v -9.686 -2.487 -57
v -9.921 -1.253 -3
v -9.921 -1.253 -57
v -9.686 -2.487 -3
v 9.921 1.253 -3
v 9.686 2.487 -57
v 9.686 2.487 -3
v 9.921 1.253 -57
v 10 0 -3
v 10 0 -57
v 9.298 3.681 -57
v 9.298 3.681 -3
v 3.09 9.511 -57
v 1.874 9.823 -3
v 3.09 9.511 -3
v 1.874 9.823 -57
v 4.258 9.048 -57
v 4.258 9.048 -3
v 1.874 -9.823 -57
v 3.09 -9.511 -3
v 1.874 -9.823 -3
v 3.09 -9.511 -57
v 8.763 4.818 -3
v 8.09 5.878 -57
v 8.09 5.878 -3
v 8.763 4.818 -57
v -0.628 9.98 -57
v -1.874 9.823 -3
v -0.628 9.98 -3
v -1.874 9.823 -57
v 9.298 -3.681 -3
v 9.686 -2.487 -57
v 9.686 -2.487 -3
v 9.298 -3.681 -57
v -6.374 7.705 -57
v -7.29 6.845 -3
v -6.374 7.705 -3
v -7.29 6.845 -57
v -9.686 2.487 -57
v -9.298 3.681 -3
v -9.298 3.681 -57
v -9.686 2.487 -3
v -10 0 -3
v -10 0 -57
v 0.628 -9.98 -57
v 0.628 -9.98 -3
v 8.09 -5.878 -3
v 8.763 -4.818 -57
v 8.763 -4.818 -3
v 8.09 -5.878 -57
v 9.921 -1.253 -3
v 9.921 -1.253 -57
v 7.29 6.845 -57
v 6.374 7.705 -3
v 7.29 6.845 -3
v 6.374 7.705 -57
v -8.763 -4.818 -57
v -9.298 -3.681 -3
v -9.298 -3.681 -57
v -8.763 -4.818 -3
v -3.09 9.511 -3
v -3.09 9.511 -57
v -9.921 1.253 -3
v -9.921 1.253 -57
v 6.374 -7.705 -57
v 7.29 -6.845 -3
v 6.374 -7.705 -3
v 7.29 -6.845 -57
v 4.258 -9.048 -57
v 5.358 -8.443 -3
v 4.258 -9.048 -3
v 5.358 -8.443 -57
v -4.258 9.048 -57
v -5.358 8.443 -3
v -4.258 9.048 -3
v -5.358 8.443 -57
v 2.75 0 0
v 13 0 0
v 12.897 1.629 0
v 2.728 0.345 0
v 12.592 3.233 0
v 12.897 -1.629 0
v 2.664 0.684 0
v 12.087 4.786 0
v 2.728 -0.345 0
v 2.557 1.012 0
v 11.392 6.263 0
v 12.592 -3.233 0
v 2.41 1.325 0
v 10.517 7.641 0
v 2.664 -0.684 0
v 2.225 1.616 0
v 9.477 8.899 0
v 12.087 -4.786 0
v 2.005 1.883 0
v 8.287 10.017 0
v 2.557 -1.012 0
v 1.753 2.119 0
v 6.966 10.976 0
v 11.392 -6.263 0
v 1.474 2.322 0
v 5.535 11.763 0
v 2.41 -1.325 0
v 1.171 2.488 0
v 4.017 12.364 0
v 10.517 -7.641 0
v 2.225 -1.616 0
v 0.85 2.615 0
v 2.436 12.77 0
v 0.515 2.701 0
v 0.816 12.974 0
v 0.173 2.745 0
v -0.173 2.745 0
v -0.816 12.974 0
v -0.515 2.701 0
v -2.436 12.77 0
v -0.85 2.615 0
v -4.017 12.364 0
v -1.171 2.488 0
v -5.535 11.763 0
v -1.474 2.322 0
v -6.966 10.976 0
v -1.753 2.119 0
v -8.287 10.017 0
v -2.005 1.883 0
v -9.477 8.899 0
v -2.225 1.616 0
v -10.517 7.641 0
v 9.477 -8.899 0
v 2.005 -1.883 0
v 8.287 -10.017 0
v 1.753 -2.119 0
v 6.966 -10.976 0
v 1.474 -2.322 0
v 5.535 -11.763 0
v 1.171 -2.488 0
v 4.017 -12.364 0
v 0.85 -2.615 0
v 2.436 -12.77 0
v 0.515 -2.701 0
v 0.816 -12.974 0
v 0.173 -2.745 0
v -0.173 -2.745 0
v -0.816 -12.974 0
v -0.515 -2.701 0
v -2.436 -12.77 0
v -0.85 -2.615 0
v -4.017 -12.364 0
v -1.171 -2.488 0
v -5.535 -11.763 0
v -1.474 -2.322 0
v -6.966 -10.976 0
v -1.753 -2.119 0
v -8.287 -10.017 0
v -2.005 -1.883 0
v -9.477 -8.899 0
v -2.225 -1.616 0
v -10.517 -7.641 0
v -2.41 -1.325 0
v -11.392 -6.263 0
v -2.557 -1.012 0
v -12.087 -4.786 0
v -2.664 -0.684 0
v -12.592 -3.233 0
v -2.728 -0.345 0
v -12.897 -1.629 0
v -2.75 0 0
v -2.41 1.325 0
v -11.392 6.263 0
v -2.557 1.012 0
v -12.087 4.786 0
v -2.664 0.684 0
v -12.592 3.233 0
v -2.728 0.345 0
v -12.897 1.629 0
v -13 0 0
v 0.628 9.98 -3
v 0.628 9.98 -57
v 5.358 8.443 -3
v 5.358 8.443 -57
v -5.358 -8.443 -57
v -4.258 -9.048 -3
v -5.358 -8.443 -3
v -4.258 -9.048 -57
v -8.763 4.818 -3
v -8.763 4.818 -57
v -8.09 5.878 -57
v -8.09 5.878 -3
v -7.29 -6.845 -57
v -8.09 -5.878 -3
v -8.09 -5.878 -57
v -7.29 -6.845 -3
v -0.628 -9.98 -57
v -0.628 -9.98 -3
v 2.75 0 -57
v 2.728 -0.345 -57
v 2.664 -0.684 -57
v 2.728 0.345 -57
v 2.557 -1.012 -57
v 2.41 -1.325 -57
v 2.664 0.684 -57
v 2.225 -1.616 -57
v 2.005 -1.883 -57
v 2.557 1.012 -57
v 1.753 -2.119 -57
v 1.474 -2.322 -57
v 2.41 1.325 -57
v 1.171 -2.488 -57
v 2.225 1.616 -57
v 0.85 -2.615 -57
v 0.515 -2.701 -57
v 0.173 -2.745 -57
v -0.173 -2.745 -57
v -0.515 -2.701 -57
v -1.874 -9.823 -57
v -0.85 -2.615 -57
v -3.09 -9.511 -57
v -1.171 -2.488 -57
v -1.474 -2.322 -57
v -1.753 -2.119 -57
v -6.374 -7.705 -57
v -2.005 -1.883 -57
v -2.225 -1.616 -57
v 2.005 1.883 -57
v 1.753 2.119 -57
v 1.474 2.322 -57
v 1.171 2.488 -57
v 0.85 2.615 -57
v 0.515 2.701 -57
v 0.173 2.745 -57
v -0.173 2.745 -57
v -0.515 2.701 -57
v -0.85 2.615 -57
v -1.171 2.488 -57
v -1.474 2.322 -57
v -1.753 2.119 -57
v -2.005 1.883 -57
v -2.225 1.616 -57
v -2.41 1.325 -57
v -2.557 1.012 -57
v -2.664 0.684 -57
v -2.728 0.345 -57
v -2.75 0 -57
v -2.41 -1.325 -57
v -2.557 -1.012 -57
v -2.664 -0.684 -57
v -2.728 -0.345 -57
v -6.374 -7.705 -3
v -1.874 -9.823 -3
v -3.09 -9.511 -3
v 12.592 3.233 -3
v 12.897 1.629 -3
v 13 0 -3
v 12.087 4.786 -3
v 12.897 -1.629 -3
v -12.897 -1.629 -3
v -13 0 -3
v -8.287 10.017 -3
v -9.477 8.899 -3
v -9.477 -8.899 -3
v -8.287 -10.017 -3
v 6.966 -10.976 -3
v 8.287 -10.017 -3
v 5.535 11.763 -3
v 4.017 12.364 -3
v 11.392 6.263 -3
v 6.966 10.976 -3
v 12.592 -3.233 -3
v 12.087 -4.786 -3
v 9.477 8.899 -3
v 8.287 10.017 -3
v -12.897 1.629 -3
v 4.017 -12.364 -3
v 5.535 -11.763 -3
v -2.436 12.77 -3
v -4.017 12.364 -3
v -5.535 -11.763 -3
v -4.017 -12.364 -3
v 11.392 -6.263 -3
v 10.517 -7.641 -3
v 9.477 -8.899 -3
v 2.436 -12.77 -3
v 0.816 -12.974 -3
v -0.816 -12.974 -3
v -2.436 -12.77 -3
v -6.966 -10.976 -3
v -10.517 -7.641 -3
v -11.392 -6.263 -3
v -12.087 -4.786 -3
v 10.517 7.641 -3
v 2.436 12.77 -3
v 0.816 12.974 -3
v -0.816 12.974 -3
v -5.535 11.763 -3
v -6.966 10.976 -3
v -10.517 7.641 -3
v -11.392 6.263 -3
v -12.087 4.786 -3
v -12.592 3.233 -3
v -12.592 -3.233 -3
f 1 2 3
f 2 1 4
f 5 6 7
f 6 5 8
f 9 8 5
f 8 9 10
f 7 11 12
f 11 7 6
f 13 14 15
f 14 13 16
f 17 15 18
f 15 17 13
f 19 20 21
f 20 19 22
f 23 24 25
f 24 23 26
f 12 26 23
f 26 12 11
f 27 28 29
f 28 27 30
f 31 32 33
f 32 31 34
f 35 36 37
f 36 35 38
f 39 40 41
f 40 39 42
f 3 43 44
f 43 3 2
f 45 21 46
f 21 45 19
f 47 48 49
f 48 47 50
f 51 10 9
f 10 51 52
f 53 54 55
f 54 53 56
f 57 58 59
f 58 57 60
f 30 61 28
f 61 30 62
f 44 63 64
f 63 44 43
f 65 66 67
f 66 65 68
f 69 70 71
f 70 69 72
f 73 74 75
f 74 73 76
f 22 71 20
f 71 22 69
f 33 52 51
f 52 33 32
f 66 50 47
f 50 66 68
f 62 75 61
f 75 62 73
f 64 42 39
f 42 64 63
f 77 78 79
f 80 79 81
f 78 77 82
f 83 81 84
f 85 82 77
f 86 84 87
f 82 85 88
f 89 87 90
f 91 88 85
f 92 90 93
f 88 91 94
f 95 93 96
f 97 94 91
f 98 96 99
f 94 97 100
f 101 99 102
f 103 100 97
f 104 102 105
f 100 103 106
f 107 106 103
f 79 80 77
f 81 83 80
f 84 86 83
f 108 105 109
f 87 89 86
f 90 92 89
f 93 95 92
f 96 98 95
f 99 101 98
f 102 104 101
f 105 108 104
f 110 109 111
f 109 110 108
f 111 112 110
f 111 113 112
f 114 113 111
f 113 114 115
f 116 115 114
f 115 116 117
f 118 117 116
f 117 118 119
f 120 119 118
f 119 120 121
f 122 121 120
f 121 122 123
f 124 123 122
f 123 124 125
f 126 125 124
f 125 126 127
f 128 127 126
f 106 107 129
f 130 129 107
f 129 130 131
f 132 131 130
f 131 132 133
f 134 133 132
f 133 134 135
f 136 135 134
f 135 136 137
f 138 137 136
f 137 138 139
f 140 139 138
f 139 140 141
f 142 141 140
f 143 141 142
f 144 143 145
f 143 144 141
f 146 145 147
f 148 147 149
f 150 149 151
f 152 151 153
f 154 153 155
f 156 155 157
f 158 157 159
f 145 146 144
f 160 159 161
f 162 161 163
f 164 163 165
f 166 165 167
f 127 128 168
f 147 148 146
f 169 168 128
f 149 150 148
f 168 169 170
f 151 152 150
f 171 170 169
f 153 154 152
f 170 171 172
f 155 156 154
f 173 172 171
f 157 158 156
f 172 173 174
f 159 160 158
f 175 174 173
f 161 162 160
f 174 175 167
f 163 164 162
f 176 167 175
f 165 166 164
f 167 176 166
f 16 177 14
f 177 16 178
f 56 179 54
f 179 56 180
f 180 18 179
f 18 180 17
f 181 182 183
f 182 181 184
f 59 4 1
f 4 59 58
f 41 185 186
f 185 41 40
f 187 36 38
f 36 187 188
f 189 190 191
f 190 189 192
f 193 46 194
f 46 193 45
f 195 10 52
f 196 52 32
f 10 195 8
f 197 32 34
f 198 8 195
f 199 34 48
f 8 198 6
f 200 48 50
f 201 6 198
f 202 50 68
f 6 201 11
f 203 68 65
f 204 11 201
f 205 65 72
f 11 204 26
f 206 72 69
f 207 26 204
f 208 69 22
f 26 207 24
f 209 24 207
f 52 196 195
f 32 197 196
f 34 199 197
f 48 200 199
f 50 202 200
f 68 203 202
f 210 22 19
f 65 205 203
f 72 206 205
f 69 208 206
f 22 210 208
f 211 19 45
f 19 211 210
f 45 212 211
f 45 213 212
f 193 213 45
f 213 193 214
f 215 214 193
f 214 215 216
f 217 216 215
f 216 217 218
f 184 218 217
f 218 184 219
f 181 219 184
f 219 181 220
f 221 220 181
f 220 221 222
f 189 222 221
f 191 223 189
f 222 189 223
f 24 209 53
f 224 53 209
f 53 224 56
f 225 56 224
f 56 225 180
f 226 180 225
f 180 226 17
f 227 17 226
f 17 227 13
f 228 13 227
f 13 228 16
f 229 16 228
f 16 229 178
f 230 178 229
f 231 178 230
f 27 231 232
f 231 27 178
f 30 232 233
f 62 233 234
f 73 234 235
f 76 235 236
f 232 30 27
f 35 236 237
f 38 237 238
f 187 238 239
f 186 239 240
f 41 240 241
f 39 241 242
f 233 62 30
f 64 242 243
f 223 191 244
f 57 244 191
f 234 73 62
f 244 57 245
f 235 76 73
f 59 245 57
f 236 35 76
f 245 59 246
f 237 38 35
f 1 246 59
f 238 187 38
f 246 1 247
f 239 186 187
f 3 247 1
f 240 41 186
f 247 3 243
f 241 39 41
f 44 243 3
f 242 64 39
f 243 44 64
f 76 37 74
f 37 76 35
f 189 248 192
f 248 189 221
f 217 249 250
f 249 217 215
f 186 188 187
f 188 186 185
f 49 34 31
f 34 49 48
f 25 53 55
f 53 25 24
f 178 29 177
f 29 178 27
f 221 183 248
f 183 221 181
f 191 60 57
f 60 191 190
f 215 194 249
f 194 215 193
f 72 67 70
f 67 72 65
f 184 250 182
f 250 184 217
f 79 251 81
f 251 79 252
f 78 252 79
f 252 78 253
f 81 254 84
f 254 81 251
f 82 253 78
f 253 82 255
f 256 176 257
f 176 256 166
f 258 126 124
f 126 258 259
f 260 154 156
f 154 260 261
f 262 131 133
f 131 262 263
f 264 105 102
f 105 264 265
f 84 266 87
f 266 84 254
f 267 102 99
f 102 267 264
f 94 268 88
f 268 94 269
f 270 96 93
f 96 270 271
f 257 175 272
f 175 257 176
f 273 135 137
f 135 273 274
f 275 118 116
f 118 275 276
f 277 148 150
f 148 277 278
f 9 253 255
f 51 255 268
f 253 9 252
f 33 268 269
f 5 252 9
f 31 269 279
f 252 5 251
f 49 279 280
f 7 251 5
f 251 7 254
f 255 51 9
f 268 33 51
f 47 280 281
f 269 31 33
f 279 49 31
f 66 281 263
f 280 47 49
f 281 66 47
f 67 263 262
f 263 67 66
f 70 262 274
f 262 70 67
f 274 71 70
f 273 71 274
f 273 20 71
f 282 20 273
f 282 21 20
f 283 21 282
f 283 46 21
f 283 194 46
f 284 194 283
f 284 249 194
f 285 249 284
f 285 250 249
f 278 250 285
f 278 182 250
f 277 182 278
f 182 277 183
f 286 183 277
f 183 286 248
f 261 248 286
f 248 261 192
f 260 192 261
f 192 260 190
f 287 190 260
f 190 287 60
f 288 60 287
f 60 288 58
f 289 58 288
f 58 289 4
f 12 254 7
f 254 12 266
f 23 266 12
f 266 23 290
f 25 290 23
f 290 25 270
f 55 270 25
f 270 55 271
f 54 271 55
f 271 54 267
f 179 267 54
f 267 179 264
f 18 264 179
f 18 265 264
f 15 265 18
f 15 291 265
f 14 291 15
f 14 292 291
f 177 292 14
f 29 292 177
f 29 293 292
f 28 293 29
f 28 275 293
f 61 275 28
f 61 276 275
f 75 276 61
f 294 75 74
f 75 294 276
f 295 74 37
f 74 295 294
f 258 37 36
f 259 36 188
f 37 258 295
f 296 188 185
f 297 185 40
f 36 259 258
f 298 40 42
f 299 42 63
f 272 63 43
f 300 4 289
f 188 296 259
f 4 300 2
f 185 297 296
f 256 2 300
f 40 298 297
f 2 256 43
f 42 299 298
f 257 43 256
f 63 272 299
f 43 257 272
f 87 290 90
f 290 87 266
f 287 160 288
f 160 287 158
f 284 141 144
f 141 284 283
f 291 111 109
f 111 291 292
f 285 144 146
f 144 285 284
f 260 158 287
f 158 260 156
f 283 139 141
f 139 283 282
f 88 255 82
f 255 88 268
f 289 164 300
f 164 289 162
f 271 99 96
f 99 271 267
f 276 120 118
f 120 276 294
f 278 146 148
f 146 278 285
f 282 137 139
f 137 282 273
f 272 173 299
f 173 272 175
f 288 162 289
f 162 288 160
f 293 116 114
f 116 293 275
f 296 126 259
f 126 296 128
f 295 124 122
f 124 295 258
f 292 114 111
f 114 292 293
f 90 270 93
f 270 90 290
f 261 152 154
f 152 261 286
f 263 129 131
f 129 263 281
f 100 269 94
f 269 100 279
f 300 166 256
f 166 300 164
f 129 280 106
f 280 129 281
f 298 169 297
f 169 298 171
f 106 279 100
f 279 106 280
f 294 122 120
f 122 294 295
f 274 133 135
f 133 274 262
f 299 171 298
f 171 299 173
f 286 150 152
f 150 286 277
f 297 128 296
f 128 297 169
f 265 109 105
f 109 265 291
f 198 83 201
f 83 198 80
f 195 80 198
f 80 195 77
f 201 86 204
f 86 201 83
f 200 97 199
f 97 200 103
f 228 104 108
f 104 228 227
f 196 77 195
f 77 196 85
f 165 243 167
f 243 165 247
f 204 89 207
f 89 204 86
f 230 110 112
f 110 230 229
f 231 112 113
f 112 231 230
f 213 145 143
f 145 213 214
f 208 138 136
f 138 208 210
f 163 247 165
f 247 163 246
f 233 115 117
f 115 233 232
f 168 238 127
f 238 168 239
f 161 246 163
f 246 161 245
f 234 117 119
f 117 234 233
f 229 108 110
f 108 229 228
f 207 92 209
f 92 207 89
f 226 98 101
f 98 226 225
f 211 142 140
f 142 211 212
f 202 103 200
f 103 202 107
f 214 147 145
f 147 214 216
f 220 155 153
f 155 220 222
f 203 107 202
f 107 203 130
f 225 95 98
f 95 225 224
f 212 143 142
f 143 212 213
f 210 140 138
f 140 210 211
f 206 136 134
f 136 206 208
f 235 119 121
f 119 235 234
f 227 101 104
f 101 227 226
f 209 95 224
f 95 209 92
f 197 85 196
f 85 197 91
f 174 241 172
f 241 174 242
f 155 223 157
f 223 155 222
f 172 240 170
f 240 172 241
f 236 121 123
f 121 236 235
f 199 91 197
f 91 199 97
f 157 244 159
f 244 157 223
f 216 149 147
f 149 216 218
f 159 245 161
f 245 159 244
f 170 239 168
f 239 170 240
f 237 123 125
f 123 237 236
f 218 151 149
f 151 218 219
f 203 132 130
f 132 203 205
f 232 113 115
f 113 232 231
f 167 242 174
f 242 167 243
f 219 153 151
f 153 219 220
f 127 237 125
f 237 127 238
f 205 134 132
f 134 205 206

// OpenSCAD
$fn = 50;


difference() {
	union() {
		translate(v = [0, 0, -57.0000000000]) {
			cylinder(h = 57, r = 10.0000000000);
		}
		translate(v = [0, 0, -3.0000000000]) {
			cylinder(h = 3, r = 13.0000000000);
		}
	}
	union() {
		#translate(v = [0, 0, -57]) {
			cylinder(h = 57, r = 2.7500000000);
		}
	}
}
